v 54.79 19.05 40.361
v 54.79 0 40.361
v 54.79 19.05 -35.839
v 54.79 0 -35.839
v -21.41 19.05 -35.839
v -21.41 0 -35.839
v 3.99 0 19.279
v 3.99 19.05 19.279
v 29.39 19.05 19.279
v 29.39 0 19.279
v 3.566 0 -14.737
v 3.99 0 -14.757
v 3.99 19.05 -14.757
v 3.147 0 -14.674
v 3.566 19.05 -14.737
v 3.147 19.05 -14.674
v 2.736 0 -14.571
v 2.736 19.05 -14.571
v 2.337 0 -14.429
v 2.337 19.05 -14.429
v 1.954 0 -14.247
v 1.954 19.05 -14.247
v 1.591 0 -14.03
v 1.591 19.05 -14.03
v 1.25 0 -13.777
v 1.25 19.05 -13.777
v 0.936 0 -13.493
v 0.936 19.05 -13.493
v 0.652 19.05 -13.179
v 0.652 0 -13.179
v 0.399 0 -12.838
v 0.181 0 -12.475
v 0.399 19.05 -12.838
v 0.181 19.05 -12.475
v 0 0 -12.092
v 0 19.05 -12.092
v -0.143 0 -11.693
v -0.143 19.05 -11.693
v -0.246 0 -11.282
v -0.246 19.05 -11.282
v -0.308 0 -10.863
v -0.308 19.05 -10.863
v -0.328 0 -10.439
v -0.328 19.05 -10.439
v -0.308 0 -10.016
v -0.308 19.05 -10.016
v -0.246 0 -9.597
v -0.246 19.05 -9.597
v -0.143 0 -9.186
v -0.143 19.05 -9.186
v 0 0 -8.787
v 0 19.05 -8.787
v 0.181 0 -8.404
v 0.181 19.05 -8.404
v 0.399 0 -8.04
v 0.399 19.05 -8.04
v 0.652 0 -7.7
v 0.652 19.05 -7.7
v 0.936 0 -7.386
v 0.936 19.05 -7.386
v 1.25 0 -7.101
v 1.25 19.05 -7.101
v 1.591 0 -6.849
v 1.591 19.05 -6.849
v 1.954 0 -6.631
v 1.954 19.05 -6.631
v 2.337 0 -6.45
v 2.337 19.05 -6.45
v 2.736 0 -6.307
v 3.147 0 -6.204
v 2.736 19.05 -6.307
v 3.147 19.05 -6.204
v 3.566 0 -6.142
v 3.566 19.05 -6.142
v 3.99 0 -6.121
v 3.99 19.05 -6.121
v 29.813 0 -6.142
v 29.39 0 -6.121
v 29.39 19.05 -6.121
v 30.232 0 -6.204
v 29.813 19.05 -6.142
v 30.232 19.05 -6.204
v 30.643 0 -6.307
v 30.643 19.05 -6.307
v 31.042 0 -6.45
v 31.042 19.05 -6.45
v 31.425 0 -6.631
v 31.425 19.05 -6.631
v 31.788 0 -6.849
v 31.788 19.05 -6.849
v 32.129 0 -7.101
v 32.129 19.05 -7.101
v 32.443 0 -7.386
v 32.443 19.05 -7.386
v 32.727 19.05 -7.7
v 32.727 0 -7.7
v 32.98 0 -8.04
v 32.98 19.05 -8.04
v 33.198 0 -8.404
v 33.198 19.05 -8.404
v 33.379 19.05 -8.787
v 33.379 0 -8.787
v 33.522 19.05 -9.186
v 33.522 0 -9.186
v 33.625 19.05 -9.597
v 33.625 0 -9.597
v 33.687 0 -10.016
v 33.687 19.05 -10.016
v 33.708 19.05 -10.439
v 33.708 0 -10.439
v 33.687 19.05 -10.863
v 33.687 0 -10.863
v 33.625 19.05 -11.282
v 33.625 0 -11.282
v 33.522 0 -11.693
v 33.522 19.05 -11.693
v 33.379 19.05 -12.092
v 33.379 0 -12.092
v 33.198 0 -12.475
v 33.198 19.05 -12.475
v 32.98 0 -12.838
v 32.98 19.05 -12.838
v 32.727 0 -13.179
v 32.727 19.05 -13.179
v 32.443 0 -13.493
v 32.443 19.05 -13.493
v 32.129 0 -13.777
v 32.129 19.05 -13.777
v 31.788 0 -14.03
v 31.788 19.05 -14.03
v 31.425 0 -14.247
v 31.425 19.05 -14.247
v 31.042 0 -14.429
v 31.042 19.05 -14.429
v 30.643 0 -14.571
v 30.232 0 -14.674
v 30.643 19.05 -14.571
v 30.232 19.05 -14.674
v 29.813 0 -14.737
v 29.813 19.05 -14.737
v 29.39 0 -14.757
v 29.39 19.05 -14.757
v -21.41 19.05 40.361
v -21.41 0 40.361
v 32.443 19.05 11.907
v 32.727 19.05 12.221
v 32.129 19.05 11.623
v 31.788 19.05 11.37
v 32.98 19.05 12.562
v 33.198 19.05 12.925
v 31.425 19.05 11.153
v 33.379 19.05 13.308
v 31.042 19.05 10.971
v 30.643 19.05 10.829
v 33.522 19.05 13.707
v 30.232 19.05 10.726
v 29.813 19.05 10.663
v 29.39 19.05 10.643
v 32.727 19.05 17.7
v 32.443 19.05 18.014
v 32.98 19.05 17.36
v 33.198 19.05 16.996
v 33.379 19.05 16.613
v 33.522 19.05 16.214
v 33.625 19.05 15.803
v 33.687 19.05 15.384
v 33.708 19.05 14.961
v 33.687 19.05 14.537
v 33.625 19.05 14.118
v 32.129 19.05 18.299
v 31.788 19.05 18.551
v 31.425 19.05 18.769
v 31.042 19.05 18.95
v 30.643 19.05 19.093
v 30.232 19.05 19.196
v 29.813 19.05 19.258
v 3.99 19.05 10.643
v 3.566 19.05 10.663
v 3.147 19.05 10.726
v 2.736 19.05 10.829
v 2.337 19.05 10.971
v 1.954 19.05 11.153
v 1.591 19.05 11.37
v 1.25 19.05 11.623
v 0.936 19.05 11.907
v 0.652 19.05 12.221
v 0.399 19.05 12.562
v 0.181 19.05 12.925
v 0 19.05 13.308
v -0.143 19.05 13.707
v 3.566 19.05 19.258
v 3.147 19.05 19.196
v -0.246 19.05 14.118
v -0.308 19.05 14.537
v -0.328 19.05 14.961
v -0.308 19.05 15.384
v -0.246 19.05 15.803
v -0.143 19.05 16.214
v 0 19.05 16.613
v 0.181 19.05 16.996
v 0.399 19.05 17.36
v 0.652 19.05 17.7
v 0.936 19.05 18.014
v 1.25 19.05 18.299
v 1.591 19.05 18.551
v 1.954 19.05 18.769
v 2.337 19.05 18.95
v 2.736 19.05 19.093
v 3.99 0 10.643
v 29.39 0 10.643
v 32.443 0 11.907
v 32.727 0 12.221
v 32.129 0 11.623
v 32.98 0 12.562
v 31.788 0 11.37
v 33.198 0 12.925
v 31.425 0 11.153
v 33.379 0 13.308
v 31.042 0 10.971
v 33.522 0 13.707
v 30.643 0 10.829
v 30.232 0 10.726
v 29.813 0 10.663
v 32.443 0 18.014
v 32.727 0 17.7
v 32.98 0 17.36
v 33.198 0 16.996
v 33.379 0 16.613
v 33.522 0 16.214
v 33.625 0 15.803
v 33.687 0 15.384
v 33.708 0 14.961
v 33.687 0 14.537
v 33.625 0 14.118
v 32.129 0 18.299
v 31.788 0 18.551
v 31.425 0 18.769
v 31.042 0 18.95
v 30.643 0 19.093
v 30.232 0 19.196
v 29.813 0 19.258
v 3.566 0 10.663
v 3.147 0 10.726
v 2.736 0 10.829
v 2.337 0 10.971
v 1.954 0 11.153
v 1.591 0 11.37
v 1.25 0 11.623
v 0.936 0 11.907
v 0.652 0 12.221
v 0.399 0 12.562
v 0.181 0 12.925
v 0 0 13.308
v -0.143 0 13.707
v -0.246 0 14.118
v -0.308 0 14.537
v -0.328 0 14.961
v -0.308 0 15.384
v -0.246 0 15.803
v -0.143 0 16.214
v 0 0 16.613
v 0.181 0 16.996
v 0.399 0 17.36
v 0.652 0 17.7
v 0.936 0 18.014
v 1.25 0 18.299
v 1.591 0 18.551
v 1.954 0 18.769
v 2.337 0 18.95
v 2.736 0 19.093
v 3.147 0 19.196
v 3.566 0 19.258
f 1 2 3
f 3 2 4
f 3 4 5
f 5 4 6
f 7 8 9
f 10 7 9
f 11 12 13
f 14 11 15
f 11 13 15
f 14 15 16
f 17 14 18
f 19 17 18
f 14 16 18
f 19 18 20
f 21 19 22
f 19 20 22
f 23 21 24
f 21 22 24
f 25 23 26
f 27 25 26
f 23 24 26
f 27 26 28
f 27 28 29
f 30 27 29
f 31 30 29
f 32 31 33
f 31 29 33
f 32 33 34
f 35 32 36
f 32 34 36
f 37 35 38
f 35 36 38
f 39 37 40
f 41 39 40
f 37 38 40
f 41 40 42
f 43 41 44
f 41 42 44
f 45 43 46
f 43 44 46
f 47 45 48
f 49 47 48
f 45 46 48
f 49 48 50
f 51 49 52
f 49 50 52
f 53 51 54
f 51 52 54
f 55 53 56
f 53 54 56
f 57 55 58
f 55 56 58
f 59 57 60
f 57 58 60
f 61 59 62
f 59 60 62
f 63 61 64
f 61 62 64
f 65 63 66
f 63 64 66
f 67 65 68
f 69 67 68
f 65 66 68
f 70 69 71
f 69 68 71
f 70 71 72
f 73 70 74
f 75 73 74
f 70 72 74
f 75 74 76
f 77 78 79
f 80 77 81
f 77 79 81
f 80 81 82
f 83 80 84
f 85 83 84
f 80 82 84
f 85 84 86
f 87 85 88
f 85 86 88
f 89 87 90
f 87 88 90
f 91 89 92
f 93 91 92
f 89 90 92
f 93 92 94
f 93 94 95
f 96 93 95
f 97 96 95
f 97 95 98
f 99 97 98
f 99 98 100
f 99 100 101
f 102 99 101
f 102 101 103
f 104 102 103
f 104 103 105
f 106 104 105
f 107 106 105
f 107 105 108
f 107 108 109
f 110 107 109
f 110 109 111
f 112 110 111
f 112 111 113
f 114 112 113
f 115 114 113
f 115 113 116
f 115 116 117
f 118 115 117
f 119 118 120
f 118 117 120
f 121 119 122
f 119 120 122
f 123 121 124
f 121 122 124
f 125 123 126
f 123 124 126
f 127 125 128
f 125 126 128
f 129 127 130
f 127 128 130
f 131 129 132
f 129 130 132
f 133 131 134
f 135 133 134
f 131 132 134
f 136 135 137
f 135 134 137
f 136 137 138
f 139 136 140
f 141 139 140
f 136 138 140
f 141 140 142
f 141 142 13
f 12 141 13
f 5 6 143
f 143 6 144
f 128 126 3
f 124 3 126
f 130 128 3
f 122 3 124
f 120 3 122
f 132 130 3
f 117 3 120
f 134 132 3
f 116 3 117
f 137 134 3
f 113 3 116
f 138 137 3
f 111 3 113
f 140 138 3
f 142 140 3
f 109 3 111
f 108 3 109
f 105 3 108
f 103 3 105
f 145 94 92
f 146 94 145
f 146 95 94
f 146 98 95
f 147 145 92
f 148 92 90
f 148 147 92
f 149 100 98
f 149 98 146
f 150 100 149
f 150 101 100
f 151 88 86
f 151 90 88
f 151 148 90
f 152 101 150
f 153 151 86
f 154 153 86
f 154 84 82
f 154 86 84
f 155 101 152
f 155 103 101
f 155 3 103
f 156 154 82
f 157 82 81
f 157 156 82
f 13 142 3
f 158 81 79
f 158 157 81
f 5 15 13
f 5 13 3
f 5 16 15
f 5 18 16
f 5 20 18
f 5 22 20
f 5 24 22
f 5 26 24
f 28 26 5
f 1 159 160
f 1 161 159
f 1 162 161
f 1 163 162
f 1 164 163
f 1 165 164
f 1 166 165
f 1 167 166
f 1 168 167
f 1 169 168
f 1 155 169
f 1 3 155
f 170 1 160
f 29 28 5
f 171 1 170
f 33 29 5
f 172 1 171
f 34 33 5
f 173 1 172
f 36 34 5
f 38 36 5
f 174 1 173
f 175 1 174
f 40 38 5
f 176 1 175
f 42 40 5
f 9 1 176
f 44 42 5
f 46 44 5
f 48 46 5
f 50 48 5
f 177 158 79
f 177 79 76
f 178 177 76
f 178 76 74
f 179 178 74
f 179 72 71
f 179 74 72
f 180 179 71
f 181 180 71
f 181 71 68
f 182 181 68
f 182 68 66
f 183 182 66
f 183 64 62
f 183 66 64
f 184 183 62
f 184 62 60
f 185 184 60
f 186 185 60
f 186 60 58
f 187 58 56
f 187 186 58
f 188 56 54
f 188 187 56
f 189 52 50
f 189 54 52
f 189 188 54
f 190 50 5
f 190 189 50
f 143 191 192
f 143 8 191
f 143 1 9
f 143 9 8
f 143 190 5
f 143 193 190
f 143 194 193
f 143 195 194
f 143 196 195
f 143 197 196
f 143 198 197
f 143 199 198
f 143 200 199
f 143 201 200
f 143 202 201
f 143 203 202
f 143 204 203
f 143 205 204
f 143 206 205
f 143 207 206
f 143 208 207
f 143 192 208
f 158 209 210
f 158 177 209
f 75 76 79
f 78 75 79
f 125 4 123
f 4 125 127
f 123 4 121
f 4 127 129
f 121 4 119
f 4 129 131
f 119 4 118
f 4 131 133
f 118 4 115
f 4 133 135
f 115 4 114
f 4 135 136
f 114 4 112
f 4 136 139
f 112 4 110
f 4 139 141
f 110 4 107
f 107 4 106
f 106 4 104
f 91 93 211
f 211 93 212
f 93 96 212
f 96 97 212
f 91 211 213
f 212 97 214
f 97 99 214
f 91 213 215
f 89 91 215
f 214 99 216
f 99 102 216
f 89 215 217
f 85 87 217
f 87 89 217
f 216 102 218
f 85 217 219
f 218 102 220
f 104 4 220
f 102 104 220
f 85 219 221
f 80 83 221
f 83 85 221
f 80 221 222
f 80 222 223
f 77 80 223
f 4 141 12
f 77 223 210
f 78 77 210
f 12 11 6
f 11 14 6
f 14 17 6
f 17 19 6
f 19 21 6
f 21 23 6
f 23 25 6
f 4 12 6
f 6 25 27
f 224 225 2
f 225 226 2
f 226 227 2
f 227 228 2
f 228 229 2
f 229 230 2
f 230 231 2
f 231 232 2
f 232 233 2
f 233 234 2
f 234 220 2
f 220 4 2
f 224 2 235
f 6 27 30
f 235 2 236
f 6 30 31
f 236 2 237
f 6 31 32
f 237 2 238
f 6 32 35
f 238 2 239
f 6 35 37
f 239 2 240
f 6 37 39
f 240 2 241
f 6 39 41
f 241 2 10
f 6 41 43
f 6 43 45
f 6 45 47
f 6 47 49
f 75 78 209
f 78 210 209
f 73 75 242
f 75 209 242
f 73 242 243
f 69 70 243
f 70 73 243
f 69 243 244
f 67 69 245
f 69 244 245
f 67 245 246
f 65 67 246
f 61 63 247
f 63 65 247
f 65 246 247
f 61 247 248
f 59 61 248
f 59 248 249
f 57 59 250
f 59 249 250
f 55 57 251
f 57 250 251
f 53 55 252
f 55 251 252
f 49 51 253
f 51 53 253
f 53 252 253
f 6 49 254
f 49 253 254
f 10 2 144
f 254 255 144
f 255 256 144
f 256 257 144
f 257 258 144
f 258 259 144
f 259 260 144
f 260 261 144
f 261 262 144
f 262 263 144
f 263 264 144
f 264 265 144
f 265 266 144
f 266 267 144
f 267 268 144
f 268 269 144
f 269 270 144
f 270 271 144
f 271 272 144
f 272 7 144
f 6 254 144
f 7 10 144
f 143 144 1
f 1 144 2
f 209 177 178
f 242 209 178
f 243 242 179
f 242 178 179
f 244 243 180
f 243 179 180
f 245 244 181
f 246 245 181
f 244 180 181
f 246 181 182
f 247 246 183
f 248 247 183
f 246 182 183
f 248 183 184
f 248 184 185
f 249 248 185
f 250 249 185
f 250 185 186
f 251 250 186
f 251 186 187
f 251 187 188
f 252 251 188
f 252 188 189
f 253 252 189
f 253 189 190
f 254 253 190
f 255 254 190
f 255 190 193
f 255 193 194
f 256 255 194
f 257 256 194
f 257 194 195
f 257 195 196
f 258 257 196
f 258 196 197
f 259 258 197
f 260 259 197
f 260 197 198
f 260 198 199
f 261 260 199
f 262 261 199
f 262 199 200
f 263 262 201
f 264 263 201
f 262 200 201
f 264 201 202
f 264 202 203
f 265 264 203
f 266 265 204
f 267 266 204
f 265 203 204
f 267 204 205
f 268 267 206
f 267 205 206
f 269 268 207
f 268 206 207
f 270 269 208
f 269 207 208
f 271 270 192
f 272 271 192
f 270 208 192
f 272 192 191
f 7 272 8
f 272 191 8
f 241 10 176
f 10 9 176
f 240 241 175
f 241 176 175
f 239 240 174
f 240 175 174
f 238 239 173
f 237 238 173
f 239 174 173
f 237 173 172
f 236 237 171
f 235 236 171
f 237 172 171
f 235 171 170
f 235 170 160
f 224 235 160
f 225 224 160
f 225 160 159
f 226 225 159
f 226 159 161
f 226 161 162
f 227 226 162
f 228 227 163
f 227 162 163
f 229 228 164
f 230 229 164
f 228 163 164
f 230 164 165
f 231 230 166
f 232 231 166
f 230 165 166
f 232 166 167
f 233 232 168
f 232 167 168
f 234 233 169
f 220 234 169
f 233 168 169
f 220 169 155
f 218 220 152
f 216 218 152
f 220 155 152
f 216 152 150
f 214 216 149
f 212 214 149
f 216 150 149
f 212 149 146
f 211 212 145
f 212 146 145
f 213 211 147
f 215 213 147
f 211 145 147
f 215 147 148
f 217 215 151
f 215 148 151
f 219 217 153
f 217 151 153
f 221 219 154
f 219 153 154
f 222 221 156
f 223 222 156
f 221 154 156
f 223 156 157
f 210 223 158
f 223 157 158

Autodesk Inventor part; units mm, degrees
ref_plane "YZ Plane" through (0, 0, 0) normal (1, 0, 0) x (0, 1, 0)
ref_plane "XZ Plane" through (0, 0, 0) normal (0, 1, 0) x (-1, 0, 0)
ref_plane "XY Plane" through (0, 0, 0) normal (0, 0, 1) x (1, 0, 0)
sketch "Sketch1" plane through (0, 0, 0) normal (0, 1, 0) x (-1, 0, 0)
  line L0 (21.4105, 40.3607) -> (-54.7895, 40.3607)
  line L1 (-54.7895, 40.3607) -> (-54.7895, -35.8393)
  line L2 (-54.7895, -35.8393) -> (21.4105, -35.8393)
  line L3 (21.4105, -35.8393) -> (21.4105, 40.3607)
  point P0 (0, 0)
  dimension "d0" = 76.2
  dimension "d1" = 76.2
extrude "Extrusion1" add sketch "Sketch1" along normal blind 19.05
sketch "Sketch2" plane through (0, 19.05, 0) normal (0, 1, 0) x (1, 0, 0)
  arc A0 (3.9895, -10.6427) -> (3.9895, -19.2787) centre (3.9895, -14.9607) ccw
  line L0 (-21.4105, 35.8393) -> (-21.4105, -40.3607) projected
  line L1 (-21.4105, -40.3607) -> (54.7895, -40.3607) projected
  arc A1 (29.3895, -19.2787) -> (29.3895, -10.6427) centre (29.3895, -14.9607) ccw
  line L2 (54.7895, -40.3607) -> (54.7895, 35.8393) projected
  line L3 (3.9895, -19.2787) -> (29.3895, -19.2787)
  line L4 (3.9895, -10.6427) -> (29.3895, -10.6427)
  point P0 (0, 0)
  dimension "d4" = 8.636
  dimension "d5" = 25.4
  dimension "d6" = 25.4
  dimension "d7" = 8.636
  dimension "d8" = 25.4
  dimension "d9" = 25.4
extrude "Extrusion2" cut sketch "Sketch2" against normal through all
sketch "Sketch3" plane through (0, 19.05, 0) normal (0, 1, 0) x (1, 0, 0)
  arc A0 (3.9895, 14.7573) -> (3.9895, 6.1213) centre (3.9895, 10.4393) ccw
  line L0 (-21.4105, 35.8393) -> (-21.4105, -40.3607) projected
  line L1 (54.7895, 35.8393) -> (-21.4105, 35.8393) projected
  arc A1 (29.3895, 6.1213) -> (29.3895, 14.7573) centre (29.3895, 10.4393) ccw
  line L2 (54.7895, -40.3607) -> (54.7895, 35.8393) projected
  line L3 (3.9895, 6.1213) -> (29.3895, 6.1213)
  line L4 (3.9895, 14.7573) -> (29.3895, 14.7573)
  point P0 (0, 0)
  dimension "d12" = 8.636
  dimension "d13" = 25.4
  dimension "d14" = 25.4
  dimension "d15" = 8.636
  dimension "d16" = 25.4
  dimension "d17" = 25.4
extrude "Extrusion3" add sketch "Sketch3" against normal through all
sketch "Sketch4" plane through (0, 19.05, 0) normal (0, 1, 0) x (1, 0, 0)
  arc A0 (3.9895, 14.7573) -> (3.9895, 6.1213) centre (3.9895, 10.4393) ccw
  line L0 (54.7895, 35.8393) -> (-21.4105, 35.8393) projected
  line L1 (-21.4105, 35.8393) -> (-21.4105, -40.3607) projected
  arc A1 (29.3895, 6.1213) -> (29.3895, 14.7573) centre (29.3895, 10.4393) ccw
  line L2 (54.7895, -40.3607) -> (54.7895, 35.8393) projected
  line L3 (3.9895, 6.1213) -> (29.3895, 6.1213)
  line L4 (29.3895, 14.7573) -> (3.9895, 14.7573)
  point P0 (0, 0)
  dimension "d20" = 8.636
  dimension "d21" = 25.4
  dimension "d22" = 25.4
  dimension "d23" = 8.636
  dimension "d24" = 25.4
  dimension "d25" = 25.4
extrude "Extrusion4" cut sketch "Sketch4" against normal blind 19.05
properties part number "slotted riser 1"
